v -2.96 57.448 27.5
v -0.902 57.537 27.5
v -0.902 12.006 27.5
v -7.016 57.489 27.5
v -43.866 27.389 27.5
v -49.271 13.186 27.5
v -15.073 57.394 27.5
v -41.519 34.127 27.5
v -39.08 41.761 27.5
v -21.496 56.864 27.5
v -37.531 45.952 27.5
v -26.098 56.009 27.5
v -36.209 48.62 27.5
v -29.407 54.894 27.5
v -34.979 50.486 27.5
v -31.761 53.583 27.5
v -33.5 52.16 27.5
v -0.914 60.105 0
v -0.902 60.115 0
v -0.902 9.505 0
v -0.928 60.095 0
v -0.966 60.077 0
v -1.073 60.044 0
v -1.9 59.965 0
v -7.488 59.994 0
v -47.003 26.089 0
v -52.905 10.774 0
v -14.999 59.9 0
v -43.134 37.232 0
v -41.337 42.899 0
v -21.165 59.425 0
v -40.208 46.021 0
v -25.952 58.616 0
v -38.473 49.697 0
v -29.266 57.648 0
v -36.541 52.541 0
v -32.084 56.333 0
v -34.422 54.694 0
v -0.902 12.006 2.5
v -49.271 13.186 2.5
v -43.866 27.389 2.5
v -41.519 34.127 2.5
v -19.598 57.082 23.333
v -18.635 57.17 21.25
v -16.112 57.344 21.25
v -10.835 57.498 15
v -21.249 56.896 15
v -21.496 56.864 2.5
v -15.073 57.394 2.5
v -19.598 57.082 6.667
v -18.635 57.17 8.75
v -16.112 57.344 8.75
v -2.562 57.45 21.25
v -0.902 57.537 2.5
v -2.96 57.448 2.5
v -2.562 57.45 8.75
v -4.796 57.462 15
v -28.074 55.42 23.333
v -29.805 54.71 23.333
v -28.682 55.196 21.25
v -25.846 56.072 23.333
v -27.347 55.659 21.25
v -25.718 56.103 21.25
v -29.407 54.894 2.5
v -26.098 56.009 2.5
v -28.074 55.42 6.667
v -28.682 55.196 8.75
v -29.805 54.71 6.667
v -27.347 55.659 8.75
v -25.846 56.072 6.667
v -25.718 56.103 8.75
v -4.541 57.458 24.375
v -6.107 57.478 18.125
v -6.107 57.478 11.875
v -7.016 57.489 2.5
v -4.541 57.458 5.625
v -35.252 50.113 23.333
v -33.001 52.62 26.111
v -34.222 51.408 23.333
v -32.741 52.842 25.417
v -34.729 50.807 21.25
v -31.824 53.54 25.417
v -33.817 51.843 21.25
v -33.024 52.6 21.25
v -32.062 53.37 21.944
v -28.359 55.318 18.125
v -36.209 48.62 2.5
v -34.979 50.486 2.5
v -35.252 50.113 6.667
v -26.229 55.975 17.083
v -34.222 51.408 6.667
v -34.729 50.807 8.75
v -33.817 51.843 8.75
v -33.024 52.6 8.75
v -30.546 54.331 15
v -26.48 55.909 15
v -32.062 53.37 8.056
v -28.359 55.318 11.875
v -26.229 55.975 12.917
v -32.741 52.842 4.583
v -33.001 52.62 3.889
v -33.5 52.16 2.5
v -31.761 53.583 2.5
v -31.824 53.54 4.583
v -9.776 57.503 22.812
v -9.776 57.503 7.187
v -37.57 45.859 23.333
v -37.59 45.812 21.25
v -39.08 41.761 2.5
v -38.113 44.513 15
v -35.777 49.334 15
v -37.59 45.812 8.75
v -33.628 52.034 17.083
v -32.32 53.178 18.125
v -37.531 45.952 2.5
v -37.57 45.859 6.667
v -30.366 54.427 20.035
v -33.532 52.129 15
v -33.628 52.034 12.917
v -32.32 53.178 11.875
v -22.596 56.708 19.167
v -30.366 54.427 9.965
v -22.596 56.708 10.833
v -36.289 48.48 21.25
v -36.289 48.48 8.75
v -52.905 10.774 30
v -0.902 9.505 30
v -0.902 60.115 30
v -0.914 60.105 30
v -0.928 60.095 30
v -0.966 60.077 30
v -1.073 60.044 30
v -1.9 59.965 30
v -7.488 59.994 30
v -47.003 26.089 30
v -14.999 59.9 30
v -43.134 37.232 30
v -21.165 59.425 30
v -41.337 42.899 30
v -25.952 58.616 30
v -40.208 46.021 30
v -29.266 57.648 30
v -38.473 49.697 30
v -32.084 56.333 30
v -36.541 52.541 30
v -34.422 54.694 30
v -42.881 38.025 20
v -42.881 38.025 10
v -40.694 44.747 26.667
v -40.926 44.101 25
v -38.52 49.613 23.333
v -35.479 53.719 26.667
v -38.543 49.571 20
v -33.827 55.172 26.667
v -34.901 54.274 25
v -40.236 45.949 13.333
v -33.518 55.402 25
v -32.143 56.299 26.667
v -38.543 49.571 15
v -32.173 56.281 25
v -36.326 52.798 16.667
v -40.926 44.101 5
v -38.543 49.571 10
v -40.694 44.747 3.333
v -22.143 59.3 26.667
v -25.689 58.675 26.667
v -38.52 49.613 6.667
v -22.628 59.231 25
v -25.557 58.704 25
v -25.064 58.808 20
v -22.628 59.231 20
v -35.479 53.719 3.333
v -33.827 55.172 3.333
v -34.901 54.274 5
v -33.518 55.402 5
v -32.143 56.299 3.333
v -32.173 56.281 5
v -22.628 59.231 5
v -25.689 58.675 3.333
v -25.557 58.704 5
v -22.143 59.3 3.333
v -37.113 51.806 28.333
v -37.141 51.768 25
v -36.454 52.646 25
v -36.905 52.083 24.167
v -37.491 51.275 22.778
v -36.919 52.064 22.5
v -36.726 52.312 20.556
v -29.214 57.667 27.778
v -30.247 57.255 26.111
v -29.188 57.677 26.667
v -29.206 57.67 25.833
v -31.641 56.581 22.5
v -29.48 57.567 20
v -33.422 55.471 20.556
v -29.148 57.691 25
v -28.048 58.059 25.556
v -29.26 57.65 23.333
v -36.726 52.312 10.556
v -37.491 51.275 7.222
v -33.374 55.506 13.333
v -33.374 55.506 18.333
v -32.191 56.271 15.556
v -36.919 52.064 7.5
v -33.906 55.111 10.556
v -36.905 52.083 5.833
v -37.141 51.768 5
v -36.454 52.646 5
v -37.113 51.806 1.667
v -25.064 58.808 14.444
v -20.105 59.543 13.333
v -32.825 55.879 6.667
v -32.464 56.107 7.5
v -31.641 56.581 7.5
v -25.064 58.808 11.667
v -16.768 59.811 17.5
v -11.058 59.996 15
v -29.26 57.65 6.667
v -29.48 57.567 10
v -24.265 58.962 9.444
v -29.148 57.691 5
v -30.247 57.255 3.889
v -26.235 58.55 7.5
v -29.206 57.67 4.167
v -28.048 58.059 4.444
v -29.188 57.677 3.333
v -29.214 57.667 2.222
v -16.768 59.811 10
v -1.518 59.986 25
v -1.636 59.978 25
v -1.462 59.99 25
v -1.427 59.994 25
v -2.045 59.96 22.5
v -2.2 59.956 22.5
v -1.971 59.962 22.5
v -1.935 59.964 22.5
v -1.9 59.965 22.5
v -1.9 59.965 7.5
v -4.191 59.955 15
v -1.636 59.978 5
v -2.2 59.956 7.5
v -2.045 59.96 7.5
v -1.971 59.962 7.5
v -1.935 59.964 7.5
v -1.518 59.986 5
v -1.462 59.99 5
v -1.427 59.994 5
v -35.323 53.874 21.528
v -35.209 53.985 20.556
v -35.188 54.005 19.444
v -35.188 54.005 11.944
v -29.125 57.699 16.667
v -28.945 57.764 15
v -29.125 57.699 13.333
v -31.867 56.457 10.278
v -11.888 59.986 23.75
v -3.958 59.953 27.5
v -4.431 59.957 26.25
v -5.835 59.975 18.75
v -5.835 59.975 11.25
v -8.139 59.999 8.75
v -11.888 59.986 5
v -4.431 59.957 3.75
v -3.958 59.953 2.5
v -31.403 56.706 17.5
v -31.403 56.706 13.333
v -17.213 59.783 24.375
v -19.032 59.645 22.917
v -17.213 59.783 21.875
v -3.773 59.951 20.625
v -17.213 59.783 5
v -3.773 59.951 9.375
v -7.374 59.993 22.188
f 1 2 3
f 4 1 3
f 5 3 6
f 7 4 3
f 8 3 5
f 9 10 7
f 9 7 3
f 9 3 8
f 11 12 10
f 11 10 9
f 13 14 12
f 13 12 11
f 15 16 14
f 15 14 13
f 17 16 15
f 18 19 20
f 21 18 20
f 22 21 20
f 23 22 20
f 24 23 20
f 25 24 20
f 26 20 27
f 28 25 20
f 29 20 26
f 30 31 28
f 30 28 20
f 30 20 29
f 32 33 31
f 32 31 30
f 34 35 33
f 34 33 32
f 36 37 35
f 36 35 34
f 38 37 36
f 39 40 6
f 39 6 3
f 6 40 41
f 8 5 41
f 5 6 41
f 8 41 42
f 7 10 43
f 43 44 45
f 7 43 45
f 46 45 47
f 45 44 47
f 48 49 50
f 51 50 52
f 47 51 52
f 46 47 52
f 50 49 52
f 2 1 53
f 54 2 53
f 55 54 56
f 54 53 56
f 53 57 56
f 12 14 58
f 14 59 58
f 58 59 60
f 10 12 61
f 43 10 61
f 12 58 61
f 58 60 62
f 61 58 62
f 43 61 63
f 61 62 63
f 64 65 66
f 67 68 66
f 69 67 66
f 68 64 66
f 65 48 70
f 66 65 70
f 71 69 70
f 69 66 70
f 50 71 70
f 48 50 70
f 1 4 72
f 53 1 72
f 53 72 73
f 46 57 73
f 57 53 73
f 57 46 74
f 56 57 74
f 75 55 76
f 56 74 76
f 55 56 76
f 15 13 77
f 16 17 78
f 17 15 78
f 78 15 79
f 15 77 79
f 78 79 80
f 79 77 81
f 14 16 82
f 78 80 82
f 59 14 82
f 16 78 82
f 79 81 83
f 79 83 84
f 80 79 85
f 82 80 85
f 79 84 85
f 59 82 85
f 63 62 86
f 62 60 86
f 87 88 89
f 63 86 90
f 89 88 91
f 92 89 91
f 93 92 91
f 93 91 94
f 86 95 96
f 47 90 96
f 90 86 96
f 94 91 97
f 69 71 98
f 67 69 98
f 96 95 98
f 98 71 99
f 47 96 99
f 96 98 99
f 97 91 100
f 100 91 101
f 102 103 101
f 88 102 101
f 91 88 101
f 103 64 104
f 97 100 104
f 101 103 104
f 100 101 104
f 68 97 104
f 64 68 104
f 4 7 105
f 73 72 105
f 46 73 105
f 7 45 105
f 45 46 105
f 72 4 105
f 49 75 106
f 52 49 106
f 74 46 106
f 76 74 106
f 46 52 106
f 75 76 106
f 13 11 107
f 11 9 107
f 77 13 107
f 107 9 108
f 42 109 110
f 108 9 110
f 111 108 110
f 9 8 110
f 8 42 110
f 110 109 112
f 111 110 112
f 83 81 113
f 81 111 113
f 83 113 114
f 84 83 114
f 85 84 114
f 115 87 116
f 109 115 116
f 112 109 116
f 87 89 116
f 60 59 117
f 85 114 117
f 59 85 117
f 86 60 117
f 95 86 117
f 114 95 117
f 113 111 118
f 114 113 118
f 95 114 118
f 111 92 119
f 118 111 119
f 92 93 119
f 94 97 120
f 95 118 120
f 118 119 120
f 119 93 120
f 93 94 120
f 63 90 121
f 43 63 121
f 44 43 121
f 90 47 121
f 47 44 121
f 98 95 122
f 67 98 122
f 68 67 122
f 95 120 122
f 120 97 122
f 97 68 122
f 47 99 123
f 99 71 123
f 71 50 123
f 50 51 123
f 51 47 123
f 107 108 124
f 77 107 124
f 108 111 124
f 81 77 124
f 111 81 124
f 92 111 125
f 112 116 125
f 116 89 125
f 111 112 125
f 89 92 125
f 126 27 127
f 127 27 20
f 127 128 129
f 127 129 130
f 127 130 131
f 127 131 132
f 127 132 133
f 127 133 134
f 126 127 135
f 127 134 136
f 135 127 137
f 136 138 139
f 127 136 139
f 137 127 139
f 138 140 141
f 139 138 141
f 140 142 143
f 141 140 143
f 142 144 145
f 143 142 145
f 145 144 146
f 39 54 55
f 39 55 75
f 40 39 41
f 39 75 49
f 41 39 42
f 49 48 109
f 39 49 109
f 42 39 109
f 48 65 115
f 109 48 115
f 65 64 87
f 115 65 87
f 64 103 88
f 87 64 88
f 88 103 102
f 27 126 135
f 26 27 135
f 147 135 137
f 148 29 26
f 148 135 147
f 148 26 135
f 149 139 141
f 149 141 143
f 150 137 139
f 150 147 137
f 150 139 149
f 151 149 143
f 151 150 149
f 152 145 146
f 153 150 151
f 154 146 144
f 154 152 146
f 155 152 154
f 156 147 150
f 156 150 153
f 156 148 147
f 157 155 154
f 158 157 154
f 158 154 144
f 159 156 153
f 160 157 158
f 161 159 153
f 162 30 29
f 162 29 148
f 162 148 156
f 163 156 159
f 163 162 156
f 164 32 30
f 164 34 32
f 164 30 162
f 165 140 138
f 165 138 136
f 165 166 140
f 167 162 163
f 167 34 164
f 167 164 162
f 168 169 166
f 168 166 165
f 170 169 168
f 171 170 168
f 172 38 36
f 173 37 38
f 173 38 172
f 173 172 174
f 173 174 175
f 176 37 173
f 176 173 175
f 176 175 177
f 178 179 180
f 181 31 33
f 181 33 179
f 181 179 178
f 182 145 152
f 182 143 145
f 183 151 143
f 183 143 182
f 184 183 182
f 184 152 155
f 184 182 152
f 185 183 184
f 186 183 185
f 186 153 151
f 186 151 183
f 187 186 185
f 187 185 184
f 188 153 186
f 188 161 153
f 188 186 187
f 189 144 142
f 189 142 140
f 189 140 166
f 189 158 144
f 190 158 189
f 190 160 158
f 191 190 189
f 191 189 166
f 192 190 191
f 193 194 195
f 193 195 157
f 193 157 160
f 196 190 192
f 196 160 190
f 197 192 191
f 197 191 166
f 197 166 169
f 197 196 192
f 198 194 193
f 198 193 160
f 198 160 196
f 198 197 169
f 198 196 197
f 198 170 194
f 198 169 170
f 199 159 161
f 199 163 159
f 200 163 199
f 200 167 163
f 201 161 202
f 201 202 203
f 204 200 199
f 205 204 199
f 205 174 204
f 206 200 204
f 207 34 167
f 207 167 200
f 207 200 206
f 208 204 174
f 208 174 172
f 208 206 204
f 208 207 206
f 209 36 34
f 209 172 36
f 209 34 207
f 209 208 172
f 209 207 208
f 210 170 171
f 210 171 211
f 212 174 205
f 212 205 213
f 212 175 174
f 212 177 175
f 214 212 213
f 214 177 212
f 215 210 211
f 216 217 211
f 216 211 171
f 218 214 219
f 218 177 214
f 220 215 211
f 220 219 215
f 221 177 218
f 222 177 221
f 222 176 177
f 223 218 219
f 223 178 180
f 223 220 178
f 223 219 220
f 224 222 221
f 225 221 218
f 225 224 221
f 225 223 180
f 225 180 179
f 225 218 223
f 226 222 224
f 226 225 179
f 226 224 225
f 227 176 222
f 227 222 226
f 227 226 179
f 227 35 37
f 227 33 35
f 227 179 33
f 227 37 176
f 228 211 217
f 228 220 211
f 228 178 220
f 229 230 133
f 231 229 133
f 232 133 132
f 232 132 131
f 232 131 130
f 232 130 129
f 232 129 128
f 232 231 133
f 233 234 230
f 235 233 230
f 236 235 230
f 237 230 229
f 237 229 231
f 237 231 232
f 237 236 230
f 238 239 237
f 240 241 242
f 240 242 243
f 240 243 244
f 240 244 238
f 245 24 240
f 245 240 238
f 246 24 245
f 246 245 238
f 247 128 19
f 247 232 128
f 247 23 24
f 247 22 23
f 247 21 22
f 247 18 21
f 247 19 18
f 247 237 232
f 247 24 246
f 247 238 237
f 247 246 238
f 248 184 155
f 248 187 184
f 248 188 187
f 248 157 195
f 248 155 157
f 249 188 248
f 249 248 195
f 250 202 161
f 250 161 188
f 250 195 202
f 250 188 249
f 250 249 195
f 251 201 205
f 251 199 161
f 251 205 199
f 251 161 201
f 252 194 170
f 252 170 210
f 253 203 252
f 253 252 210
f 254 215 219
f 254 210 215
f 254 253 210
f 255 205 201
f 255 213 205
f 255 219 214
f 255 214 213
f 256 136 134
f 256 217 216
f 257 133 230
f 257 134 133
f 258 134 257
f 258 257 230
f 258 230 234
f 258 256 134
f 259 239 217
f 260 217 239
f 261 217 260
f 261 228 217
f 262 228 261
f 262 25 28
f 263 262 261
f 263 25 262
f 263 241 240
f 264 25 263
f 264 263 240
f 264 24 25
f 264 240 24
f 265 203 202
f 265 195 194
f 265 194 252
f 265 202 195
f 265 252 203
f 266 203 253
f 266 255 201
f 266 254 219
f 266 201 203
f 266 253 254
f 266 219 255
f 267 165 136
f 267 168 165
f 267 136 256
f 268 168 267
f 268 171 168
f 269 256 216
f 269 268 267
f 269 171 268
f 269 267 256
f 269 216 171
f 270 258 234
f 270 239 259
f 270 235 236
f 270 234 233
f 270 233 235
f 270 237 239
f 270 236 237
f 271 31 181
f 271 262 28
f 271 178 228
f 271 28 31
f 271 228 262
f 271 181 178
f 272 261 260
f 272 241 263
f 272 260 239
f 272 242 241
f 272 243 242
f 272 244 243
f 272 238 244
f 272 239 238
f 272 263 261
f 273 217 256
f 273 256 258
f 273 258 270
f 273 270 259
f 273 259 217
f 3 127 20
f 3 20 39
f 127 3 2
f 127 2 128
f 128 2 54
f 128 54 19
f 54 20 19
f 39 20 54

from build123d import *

# Parameters (mm, degrees)
F1_DEPTH = 30
F2_T     = -2.5


with BuildPart() as f1:
    # F0 (on Top) → F1 (new body)
    with BuildSketch(Plane.XY):
        with BuildLine():
            add(Edge.make_bspline(
                [(-52.9047064483, 10.7738440856), (-49.3151800836, 19.9011107355), (-42.4829823767, 37.2736785727), (-36.1918142658, 62.9987887901), (-1.5945333662, 59.435698275), (-0.9017228149, 60.1154789329)],
                knots=[0, 0, 0, 0, 0.323980896, 0.6166556002, 0.9387106654, 0.9387106654, 0.9387106654, 0.9387106654], degree=3))
            Line((-52.9047064483, 10.7738440856), (-0.9017228149, 9.5054339617))
            Line((-0.9017228149, 9.5054339617), (-0.9017228149, 60.1154789329))
        make_face()
    extrude(amount=F1_DEPTH)

    # F2
    f2_openings = [f1.faces().sort_by_distance(p)[0] for p in [
        (-0.901723, 34.810456, 15),
    ]]
    offset(amount=F2_T, openings=f2_openings, kind=Kind.INTERSECTION)


solid = f1.part
